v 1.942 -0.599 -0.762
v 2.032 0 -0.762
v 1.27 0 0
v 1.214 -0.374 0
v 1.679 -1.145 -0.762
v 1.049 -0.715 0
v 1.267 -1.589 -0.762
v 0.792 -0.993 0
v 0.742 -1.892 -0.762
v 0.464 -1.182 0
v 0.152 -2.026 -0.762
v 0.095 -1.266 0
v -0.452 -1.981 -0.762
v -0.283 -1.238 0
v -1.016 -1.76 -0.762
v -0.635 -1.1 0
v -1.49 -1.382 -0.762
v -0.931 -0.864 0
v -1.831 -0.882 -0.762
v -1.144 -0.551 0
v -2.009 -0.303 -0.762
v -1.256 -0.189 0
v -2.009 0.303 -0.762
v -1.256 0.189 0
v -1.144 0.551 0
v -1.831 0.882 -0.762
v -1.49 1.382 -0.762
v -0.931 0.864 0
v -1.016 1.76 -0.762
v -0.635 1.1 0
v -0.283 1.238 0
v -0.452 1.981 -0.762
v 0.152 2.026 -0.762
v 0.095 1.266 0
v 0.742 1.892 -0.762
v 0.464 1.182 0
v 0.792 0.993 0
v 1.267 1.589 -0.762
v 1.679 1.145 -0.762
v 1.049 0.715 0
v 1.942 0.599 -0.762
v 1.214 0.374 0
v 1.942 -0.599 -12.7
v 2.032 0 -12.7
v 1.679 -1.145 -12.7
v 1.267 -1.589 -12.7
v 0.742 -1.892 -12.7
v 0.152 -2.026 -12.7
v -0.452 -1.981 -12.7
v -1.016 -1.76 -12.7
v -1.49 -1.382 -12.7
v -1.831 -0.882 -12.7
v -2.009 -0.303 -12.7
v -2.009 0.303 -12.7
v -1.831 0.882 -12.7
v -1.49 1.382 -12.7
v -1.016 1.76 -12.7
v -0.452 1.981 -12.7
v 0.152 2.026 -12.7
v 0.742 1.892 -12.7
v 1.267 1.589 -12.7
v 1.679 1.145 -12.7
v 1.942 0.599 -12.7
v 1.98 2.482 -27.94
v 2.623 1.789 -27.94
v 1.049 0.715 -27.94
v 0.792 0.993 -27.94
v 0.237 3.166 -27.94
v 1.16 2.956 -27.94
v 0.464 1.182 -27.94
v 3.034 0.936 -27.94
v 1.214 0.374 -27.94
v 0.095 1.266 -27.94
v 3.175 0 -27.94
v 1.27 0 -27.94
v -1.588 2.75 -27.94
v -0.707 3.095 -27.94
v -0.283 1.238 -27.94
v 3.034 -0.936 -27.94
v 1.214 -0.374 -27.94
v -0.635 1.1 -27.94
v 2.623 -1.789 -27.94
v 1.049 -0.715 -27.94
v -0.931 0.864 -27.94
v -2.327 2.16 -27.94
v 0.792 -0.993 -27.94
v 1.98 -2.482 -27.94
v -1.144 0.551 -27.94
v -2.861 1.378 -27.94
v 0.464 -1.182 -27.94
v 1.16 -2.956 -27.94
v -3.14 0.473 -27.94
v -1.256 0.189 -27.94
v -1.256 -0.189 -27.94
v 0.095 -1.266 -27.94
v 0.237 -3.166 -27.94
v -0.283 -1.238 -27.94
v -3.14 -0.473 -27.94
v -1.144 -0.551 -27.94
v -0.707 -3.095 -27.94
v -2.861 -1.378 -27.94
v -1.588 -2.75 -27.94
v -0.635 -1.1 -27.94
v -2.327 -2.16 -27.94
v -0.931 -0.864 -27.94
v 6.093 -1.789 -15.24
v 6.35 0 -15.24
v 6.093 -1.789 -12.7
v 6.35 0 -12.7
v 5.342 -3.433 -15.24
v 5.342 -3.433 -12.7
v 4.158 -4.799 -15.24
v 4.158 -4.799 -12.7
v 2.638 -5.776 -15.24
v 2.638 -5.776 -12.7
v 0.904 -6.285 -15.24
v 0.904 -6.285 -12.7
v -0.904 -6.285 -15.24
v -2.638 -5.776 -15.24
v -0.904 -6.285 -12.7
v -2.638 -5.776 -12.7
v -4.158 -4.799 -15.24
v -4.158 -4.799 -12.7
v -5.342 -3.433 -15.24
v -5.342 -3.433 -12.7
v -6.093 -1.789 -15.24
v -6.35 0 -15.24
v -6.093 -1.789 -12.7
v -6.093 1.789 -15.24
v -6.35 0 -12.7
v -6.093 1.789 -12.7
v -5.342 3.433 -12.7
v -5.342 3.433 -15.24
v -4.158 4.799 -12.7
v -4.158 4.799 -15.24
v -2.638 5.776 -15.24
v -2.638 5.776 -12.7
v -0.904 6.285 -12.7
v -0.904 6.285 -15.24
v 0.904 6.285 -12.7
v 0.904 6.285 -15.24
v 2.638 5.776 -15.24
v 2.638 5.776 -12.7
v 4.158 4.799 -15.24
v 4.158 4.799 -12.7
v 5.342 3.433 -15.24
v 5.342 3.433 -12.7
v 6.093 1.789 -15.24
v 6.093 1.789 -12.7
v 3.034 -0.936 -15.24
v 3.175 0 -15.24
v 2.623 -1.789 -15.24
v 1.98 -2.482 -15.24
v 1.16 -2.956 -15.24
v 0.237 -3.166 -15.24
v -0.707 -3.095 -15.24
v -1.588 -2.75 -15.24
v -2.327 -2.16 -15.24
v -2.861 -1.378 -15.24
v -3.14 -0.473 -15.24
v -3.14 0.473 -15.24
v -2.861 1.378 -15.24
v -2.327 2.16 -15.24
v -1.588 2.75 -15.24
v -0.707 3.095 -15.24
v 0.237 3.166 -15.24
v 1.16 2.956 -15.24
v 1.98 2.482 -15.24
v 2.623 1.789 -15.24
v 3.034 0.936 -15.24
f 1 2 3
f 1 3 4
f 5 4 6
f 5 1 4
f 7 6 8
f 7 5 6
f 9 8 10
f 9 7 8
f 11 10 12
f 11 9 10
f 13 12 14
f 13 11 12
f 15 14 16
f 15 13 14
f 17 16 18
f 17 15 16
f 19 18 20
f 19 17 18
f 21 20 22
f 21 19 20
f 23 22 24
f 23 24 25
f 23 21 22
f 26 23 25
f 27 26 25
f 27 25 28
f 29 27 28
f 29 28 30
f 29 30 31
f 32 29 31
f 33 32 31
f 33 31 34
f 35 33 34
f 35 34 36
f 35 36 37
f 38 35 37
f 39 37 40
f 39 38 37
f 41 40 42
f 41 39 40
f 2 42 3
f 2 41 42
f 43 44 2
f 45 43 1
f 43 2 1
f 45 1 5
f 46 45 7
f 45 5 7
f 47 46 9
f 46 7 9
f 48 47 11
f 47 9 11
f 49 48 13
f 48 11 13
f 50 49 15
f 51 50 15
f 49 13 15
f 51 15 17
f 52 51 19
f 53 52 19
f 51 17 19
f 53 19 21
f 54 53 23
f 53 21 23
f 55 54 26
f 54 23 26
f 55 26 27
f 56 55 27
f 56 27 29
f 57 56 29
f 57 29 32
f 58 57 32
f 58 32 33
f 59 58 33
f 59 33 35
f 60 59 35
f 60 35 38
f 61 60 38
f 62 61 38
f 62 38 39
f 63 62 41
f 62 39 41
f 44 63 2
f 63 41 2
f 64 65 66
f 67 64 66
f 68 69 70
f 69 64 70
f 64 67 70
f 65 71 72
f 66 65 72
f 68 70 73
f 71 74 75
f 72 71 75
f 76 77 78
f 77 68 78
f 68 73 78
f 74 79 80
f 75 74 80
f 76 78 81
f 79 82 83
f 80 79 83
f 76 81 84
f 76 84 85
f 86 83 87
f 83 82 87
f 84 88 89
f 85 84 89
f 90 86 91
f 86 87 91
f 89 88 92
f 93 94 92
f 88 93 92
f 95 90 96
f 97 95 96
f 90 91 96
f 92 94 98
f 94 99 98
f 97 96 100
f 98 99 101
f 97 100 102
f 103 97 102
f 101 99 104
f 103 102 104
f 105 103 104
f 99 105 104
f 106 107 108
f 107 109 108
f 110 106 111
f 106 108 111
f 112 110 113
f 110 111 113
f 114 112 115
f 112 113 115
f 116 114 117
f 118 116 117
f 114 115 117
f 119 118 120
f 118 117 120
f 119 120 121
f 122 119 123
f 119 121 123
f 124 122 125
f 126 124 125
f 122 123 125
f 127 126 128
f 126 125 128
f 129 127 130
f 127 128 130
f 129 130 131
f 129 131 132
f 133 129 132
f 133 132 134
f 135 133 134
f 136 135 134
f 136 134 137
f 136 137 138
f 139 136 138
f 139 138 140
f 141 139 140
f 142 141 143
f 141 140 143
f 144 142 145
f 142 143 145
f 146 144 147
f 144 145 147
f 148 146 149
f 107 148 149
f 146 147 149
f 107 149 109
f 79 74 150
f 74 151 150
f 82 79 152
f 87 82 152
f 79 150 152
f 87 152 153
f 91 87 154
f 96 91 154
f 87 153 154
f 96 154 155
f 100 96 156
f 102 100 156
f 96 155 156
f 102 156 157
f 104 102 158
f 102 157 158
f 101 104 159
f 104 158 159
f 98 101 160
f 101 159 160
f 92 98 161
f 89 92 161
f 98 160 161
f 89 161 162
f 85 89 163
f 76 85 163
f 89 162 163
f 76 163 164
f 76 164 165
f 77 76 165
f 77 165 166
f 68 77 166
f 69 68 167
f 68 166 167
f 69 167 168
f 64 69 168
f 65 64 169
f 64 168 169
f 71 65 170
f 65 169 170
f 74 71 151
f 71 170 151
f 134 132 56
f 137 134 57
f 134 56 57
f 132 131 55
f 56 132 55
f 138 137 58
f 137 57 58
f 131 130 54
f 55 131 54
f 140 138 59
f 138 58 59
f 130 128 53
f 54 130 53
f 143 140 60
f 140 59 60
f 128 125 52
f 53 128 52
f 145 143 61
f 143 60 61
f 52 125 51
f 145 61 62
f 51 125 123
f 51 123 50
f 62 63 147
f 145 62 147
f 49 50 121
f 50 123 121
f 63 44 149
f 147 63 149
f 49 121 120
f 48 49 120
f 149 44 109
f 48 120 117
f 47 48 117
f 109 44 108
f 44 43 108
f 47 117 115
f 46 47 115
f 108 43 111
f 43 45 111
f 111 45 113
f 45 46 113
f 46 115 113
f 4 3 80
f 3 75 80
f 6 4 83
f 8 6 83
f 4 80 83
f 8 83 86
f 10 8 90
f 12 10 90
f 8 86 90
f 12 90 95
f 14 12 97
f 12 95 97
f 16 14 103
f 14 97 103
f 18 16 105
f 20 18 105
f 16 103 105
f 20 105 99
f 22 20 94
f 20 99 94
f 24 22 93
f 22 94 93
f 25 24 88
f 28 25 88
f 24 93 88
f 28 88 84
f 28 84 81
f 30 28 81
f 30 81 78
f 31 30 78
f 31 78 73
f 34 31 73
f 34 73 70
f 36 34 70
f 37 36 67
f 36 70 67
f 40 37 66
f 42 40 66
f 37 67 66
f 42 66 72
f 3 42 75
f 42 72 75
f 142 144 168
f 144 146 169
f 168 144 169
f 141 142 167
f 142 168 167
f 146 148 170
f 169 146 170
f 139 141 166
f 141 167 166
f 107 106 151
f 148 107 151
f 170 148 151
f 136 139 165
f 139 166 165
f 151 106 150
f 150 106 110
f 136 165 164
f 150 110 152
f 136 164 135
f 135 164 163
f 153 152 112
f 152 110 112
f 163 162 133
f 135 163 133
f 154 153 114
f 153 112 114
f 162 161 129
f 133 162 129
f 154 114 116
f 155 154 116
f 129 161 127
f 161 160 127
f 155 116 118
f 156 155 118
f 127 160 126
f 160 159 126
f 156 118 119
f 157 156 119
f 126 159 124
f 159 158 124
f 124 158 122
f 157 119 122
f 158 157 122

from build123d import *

# Parameters (mm, degrees)
F2_SIZE = 0.76199


# Not quite as in the source:
# - a fillet or chamfer is up to 0.001 mm smaller than in the source, because OpenCascade refuses the exact size


with BuildPart() as f1:
    # F0 (on Front) → F1 (revolve)
    with BuildSketch(Plane.XZ):
        Polygon((2.032, 0), (1.27, 0), (1.27, -13.97), (1.27, -27.94), (3.175, -27.94), (3.175, -15.24), (6.35, -15.24), (6.35, -12.7), (2.032, -12.7), align=None)
    revolve(axis=Axis((0, 0, -18.8239812851), (0, 0, -1)))

    # F2 (size 0.762 in the source; OpenCascade refuses exactly that, so slightly less here)
    f2_edges = [f1.edges().sort_by_distance(p)[0] for p in [
        (-2.032, 0, 0),
    ]]
    chamfer(f2_edges, length=F2_SIZE)


solid = f1.part
